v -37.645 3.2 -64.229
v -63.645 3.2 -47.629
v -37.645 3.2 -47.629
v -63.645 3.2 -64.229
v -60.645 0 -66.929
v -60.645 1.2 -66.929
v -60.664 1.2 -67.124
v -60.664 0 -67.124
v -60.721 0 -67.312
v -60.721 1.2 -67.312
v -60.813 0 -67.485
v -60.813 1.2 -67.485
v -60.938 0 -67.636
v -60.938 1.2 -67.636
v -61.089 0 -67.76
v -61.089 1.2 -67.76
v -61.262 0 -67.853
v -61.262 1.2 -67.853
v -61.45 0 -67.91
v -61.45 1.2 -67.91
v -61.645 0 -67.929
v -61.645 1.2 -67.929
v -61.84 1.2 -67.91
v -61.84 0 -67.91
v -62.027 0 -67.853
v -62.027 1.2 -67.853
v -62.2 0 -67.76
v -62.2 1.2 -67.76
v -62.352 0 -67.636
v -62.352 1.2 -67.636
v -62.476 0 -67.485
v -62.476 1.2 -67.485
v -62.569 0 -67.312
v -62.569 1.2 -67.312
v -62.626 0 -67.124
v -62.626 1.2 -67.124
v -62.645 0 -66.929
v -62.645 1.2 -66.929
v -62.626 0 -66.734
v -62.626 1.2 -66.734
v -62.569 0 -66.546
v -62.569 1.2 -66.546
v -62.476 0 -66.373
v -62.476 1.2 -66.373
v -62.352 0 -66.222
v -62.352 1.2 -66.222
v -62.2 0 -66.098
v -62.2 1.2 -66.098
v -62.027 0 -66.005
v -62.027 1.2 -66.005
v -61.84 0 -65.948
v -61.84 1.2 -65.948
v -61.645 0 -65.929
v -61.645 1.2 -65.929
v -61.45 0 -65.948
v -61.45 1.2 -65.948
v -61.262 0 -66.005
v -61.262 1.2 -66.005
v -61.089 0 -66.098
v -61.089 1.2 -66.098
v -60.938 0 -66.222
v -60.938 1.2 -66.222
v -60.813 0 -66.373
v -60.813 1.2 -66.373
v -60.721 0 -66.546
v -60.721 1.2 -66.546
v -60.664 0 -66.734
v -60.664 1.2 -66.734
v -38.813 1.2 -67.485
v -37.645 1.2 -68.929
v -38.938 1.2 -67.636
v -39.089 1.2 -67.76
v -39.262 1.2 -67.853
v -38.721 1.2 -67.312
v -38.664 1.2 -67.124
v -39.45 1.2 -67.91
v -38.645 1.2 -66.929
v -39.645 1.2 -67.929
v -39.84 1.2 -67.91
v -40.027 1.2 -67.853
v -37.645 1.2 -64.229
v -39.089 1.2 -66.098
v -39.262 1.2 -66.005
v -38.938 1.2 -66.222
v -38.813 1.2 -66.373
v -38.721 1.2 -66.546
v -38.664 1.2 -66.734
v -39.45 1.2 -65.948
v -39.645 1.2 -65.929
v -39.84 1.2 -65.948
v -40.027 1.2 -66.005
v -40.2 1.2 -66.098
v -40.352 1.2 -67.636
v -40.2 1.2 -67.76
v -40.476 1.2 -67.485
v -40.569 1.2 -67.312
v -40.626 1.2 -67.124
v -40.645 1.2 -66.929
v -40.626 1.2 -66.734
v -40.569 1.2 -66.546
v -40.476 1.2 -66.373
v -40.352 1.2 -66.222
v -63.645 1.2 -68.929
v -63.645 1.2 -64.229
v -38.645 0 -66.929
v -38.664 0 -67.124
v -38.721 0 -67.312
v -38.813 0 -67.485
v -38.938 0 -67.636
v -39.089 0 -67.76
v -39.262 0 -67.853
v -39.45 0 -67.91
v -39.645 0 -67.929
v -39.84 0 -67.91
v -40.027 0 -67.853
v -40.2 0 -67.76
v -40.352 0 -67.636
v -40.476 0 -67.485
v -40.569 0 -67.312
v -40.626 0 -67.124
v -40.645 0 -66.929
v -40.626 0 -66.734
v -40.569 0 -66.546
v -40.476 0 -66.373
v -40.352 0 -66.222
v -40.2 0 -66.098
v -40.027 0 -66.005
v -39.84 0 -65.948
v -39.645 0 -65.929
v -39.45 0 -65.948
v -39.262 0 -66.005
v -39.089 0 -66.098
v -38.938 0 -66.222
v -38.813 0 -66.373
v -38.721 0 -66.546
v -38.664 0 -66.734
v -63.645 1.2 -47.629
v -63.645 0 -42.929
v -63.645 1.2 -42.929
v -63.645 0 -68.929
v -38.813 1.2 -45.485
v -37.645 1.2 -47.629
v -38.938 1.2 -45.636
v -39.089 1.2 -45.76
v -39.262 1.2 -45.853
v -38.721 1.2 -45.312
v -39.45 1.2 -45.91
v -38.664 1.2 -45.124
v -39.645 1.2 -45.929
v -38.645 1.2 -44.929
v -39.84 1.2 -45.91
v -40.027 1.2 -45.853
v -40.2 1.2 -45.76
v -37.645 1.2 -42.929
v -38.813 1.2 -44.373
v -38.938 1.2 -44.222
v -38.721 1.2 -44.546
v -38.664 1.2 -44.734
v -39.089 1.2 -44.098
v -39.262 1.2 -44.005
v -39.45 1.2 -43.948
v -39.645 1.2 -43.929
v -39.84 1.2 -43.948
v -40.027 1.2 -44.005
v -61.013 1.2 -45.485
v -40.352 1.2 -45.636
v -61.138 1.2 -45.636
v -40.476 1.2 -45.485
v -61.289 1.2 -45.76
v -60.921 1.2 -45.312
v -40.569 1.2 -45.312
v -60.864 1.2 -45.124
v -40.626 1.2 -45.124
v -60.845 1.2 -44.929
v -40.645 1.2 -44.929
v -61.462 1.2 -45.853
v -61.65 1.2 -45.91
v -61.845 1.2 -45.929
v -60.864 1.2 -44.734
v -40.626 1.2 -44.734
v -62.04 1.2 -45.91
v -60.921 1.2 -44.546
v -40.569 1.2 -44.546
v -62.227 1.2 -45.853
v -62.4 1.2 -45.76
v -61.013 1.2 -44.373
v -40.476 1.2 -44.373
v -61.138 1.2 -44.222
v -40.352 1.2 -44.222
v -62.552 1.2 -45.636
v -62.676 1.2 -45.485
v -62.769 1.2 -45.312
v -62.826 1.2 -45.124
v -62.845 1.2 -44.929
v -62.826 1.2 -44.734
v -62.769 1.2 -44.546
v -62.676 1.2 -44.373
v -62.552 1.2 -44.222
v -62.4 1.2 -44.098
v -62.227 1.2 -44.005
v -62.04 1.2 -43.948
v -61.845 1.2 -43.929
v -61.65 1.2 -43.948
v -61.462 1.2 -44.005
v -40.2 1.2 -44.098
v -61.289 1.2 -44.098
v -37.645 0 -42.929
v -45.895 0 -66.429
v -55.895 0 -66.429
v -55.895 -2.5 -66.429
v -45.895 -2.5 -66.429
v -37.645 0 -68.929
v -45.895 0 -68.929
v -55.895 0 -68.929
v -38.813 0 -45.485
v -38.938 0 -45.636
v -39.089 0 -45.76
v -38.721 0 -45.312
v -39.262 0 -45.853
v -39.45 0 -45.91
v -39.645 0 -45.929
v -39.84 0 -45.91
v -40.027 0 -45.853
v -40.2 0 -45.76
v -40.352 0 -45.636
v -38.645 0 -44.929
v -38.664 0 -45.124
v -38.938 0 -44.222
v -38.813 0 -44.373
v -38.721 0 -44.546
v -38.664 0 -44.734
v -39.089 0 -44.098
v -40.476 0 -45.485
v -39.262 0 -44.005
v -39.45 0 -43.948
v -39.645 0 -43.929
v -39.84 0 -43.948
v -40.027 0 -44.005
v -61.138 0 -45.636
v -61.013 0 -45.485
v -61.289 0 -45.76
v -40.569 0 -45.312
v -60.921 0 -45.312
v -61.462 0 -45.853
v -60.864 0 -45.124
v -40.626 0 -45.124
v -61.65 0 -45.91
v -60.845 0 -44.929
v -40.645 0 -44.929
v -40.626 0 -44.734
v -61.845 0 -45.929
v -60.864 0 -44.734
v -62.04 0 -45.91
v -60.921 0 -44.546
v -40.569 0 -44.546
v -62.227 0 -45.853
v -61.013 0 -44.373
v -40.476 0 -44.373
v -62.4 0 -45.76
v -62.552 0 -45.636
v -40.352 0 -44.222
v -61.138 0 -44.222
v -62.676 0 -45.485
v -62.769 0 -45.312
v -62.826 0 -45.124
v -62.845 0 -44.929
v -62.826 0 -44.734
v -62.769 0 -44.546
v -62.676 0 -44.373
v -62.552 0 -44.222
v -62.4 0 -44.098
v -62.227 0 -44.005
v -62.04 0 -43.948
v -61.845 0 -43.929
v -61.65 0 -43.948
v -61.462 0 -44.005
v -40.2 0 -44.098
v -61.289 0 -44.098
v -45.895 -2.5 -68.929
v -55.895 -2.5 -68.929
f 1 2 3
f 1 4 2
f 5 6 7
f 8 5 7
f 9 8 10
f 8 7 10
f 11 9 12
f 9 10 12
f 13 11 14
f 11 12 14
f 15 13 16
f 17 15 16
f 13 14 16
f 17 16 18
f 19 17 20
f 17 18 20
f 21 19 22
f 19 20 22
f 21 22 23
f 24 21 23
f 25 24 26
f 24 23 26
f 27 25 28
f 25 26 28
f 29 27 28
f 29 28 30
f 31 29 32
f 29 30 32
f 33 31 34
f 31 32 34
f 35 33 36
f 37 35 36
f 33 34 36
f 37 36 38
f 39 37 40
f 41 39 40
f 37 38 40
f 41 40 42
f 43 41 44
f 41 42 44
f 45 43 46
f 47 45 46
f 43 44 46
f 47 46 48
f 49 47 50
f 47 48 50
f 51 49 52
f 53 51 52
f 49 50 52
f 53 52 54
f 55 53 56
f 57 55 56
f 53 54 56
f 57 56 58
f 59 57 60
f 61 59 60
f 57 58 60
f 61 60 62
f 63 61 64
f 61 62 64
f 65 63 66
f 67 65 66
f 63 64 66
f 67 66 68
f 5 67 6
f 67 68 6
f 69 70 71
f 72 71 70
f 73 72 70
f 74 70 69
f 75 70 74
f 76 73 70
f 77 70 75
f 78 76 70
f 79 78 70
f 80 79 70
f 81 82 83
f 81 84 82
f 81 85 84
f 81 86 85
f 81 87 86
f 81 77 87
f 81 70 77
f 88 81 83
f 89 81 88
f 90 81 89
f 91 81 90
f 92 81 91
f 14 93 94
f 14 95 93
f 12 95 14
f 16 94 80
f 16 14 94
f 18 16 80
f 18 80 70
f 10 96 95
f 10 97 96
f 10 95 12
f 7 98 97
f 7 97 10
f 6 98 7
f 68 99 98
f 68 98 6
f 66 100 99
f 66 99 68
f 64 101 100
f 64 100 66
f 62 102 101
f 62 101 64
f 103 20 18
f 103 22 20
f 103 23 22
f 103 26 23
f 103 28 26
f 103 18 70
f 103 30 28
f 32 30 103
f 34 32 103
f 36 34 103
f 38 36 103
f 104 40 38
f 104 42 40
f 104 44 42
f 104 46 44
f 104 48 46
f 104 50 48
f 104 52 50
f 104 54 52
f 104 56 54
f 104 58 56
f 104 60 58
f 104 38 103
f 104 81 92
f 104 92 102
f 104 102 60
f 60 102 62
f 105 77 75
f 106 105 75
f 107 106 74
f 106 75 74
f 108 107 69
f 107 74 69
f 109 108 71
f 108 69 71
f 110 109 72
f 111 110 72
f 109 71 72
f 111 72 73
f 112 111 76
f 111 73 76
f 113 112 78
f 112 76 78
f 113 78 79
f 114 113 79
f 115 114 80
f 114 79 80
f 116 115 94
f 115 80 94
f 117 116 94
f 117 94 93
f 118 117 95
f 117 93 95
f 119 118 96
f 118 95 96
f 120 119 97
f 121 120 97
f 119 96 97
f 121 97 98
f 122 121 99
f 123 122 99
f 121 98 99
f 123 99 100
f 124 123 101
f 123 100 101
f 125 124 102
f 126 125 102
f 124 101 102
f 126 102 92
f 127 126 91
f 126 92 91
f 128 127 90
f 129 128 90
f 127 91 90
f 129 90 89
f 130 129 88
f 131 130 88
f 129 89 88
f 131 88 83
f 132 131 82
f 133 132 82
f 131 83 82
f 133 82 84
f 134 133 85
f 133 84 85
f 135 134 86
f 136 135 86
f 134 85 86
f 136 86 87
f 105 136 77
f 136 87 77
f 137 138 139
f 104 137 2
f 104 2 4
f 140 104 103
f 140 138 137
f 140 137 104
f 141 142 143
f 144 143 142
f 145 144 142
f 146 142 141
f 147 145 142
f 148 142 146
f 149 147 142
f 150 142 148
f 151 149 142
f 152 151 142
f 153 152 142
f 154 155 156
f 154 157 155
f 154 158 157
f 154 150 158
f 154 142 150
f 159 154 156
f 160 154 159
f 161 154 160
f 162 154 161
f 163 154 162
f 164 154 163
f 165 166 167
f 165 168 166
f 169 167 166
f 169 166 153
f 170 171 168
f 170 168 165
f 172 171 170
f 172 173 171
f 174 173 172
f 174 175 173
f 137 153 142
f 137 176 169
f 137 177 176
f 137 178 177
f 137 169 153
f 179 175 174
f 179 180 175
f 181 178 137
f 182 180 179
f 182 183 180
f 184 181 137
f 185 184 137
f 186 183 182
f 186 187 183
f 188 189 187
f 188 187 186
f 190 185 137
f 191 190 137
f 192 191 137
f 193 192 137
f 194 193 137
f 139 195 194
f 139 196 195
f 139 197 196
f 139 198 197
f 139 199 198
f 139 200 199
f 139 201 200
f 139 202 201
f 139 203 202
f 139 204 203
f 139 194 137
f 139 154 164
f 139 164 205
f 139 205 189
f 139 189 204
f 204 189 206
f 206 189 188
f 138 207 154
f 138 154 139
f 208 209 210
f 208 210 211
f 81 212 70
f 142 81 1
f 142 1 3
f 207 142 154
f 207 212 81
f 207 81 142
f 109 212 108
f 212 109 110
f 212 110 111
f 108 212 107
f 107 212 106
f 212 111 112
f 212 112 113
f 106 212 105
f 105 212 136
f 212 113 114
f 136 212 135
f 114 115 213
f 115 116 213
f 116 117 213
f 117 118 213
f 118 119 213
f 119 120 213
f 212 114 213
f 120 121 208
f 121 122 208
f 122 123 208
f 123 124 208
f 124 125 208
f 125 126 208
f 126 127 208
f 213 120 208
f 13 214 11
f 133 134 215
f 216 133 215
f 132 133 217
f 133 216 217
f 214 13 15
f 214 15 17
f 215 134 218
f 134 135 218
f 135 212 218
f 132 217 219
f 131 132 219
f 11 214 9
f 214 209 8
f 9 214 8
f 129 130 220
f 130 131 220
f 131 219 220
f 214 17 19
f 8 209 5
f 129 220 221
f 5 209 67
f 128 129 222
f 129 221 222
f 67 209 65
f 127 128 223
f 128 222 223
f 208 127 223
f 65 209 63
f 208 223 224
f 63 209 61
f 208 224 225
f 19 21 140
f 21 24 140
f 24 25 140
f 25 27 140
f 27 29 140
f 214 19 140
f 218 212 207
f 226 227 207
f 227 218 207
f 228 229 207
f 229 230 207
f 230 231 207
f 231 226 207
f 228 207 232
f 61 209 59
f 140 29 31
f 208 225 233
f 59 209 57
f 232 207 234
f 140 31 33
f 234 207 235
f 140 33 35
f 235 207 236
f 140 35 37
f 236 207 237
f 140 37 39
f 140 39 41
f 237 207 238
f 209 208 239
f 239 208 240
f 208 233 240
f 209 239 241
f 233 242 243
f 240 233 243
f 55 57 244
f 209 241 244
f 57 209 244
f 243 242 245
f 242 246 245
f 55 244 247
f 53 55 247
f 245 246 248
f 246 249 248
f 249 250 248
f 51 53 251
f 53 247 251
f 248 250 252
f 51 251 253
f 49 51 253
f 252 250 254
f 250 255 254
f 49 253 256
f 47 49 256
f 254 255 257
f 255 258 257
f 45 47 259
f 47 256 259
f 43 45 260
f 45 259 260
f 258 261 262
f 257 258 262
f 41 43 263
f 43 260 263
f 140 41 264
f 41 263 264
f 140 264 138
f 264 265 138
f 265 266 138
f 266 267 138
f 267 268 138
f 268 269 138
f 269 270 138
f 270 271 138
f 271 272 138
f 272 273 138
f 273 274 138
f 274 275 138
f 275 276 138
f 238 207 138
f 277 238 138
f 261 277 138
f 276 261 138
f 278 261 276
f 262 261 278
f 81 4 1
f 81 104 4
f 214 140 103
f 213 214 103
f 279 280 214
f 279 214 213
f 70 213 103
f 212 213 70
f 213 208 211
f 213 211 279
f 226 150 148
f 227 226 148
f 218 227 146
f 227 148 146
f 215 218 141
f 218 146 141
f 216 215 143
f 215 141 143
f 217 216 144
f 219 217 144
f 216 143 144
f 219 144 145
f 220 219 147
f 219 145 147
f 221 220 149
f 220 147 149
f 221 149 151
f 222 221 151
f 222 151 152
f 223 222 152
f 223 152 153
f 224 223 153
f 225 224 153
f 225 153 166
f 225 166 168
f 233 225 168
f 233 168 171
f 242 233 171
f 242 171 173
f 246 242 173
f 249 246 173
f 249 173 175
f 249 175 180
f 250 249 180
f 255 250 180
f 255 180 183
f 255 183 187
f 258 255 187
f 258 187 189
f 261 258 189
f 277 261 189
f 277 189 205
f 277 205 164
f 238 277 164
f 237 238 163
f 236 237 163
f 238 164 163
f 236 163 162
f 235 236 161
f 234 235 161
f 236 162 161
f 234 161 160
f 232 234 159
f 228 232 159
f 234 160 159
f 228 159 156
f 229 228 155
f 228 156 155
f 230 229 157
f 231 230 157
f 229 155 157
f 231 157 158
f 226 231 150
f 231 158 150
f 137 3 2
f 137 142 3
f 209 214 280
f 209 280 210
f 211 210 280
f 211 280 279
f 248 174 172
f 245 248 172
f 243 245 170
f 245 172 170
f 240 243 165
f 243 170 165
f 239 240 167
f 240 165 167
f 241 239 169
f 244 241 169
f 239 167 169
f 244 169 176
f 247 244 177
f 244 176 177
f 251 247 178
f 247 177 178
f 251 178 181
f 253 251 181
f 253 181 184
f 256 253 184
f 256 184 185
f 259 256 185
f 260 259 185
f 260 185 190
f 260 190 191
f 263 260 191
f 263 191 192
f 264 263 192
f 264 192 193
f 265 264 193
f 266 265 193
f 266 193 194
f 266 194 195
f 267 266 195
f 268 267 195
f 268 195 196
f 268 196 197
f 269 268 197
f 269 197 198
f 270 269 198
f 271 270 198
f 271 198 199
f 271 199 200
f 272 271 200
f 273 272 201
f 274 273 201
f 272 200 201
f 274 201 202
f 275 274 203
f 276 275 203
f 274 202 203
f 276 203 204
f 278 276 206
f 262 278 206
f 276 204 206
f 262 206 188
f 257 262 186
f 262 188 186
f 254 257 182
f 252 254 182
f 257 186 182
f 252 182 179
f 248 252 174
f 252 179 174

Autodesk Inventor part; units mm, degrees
ref_plane "YZ Plane" through (0, 0, 0) normal (1, 0, 0) x (0, 1, 0)
ref_plane "XZ Plane" through (0, 0, 0) normal (0, 1, 0) x (-1, 0, 0)
ref_plane "XY Plane" through (0, 0, 0) normal (0, 0, 1) x (1, 0, 0)
sketch "Sketch1" plane through (0, 0, 0) normal (0, 1, 0) x (-1, 0, 0)
  line L0 (63.6448, -68.929) -> (37.6448, -68.929)
  line L1 (37.6448, -68.929) -> (37.6448, -42.929)
  line L2 (37.6448, -42.929) -> (63.6448, -42.929)
  line L3 (63.6448, -42.929) -> (63.6448, -68.929)
  point P0 (0, 0)
  dimension "d0" = 26
  dimension "d1" = 26
extrude "Extrusion1" add sketch "Sketch1" along normal blind 1.2
sketch "Sketch2" plane through (0, 1.2, 0) normal (0, 1, 0) x (1, 0, 0)
  line L0 (-63.6448, 68.929) -> (-63.6448, 42.929) projected
  line L1 (-37.6448, 42.929) -> (-37.6448, 68.929) projected
  line L2 (-63.6448, 64.229) -> (-37.6448, 64.229)
  line L3 (-37.6448, 64.229) -> (-37.6448, 47.629)
  line L4 (-37.6448, 47.629) -> (-63.6448, 47.629)
  line L5 (-63.6448, 47.629) -> (-63.6448, 64.229)
  line L6 (-37.6448, 68.929) -> (-63.6448, 68.929) projected
  point P0 (0, 0)
  point P1 (-63.6448, 47.629)
  dimension "d4" = 4.7
  dimension "d5" = 16.6
extrude "Extrusion2" add sketch "Sketch2" along normal blind 2 contours L2 L1 L4 L0
sketch "Sketch3" plane through (0, 1.2, 0) normal (0, 1, 0) x (1, 0, 0)
  circle A0 centre (-61.6448, 66.929) radius 1
  circle A1 centre (-39.6448, 66.929) radius 1
  circle A2 centre (-39.6448, 44.929) radius 1
  circle A3 centre (-61.8448, 44.929) radius 1
  line L0 (-63.6448, 68.929) -> (-63.6448, 64.229) projected
  line L1 (-37.6448, 68.929) -> (-63.6448, 68.929) projected
  line L2 (-37.6448, 64.229) -> (-37.6448, 68.929) projected
  line L3 (-37.6448, 42.929) -> (-37.6448, 47.629) projected
  line L4 (-63.6448, 42.929) -> (-37.6448, 42.929) projected
  line L5 (-63.6448, 47.629) -> (-63.6448, 42.929) projected
  point P0 (0, 0)
  point P1 (-63.6448, 45.279)
  dimension "d8" = 2
  dimension "d9" = 2
  dimension "d10" = 2
  dimension "d11" = 2
  dimension "d12" = 2
  dimension "d13" = 2
  dimension "d14" = 2
  dimension "d15" = 2
  dimension "d16" = 2
  dimension "d17" = 2
  dimension "d18" = 2
  dimension "d19" = 1.8
extrude "Extrusion3" cut sketch "Sketch3" against normal through all
sketch "Sketch4" plane through (0, 0, 0) normal (0, -1, 0) x (1, 0, 0)
  line L0 (-45.8948, -68.929) -> (-55.8948, -68.929)
  line L1 (-55.8948, -68.929) -> (-55.8948, -66.429)
  line L2 (-55.8948, -66.429) -> (-45.8948, -66.429)
  line L3 (-45.8948, -66.429) -> (-45.8948, -68.929)
  line L4 (-37.6448, -68.929) -> (-63.6448, -68.929) projected
  line L5 (-37.6448, -42.929) -> (-37.6448, -68.929) projected
  point P0 (0, 0)
  dimension "d22" = 10
  dimension "d23" = 2.5
  dimension "d24" = 0
  dimension "d25" = 8.25
extrude "Extrusion4" add sketch "Sketch4" along normal blind 2.5
equation "\"d14\" = d13"
equation "\"d15\" = d14"
equation "\"d16\" = d14"
equation "\"d17\" = d15"
equation "\"d18\" = d12"
properties part number "ssd1360"
